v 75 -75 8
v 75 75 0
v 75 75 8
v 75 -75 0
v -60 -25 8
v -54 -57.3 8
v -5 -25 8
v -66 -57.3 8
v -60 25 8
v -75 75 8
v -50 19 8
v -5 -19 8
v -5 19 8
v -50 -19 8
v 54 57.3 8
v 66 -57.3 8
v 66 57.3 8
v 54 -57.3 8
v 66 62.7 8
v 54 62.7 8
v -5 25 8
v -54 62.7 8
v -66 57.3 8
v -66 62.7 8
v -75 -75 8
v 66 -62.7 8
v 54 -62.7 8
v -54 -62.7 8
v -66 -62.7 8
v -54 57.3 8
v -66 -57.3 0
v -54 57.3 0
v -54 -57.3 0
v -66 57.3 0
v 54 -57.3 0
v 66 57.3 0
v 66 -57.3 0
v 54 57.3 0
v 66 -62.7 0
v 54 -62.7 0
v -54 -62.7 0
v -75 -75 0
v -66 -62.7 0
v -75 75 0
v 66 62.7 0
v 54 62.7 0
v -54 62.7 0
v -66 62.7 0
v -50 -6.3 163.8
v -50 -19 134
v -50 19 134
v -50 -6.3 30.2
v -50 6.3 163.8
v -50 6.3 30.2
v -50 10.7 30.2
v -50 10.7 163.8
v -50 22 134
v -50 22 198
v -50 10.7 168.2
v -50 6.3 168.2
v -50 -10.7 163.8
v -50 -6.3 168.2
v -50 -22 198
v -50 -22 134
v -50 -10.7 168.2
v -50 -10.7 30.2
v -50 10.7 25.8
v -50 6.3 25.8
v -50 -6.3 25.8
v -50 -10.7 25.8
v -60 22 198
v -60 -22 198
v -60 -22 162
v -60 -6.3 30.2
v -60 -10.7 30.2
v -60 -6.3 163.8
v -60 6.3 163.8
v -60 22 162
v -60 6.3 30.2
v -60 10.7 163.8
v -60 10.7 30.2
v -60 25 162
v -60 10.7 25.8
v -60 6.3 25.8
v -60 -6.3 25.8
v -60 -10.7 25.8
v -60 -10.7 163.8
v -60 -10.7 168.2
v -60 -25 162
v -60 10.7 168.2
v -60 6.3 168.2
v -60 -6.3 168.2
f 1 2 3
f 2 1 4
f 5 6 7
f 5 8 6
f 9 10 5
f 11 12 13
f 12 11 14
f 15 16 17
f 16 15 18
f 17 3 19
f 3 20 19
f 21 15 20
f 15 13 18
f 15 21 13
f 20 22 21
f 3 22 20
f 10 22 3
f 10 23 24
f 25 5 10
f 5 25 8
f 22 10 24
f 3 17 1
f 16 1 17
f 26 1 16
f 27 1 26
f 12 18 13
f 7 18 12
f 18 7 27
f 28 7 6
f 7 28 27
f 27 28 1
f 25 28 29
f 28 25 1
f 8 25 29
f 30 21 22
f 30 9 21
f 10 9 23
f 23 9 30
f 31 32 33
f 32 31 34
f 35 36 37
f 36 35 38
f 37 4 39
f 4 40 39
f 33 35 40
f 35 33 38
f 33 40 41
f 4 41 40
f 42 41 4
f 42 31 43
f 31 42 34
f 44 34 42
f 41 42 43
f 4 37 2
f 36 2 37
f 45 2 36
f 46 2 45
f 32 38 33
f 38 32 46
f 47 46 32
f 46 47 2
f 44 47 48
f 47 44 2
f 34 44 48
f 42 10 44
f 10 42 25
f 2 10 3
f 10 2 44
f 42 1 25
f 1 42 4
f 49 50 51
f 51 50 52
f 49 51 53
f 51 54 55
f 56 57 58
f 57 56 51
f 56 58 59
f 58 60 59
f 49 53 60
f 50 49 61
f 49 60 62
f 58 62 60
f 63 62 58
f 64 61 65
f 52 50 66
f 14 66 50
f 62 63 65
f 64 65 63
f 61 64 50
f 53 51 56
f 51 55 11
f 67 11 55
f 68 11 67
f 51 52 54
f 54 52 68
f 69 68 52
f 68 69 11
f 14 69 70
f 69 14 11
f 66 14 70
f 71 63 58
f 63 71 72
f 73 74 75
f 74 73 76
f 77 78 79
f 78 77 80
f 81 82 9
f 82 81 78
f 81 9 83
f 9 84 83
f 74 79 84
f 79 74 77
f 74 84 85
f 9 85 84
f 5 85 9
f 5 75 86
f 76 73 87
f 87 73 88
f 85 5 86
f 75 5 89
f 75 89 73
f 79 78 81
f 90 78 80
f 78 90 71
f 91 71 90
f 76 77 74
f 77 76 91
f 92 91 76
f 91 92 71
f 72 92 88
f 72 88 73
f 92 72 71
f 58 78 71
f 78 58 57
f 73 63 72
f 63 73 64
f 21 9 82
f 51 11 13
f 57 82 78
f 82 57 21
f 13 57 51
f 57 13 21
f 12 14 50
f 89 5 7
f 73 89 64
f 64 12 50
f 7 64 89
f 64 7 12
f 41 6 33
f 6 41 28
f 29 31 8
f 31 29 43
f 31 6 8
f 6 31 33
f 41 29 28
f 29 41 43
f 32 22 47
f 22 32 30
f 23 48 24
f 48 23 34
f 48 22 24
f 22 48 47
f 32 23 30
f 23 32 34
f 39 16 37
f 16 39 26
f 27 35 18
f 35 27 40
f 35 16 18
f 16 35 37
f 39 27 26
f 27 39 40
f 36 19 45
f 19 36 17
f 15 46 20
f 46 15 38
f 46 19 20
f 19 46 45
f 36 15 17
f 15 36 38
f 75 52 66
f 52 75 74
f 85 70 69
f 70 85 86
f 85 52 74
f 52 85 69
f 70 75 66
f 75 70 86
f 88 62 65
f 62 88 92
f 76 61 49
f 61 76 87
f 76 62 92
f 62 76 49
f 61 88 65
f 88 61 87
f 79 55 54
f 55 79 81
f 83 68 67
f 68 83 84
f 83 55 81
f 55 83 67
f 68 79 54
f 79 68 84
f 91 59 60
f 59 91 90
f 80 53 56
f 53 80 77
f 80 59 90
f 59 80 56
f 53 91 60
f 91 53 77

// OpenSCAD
// Millimetres. Prototype; verify the installed lid/PACS plate and rail before print.
// Bare Jackal lid: 120 mm square, M5x0.8. PACS 026369: 80 mm square.
deck_hole_pitch = 120;
print_clearance = 0.4;
rail_hole_pitch = 17;
rail_heights = [28, 166];

module gusset(y) {
  translate([-60, y, 8])
    rotate([90,0,0])
      linear_extrude(height=6)
        polygon([[0,0],[55,0],[0,154]]);
}
module rear_deck_mount() {
  difference() {
    union() {
      translate([-75,-75,0]) cube([150,150,8]);
      translate([-60,-22,8]) cube([10,44,190]);
      gusset(25);
      gusset(-19);
    }
    for (x=[-1,1], y=[-1,1])
      translate([x*deck_hole_pitch/2-6, y*deck_hole_pitch/2-(5+print_clearance)/2, -1])
        cube([12,5+print_clearance,10]);
    for (y=[-1,1], z=rail_heights)
      translate([-61,y*rail_hole_pitch/2-(4+print_clearance)/2,z-(4+print_clearance)/2])
        cube([12,4+print_clearance,4+print_clearance]);
  }
}
rear_deck_mount();
